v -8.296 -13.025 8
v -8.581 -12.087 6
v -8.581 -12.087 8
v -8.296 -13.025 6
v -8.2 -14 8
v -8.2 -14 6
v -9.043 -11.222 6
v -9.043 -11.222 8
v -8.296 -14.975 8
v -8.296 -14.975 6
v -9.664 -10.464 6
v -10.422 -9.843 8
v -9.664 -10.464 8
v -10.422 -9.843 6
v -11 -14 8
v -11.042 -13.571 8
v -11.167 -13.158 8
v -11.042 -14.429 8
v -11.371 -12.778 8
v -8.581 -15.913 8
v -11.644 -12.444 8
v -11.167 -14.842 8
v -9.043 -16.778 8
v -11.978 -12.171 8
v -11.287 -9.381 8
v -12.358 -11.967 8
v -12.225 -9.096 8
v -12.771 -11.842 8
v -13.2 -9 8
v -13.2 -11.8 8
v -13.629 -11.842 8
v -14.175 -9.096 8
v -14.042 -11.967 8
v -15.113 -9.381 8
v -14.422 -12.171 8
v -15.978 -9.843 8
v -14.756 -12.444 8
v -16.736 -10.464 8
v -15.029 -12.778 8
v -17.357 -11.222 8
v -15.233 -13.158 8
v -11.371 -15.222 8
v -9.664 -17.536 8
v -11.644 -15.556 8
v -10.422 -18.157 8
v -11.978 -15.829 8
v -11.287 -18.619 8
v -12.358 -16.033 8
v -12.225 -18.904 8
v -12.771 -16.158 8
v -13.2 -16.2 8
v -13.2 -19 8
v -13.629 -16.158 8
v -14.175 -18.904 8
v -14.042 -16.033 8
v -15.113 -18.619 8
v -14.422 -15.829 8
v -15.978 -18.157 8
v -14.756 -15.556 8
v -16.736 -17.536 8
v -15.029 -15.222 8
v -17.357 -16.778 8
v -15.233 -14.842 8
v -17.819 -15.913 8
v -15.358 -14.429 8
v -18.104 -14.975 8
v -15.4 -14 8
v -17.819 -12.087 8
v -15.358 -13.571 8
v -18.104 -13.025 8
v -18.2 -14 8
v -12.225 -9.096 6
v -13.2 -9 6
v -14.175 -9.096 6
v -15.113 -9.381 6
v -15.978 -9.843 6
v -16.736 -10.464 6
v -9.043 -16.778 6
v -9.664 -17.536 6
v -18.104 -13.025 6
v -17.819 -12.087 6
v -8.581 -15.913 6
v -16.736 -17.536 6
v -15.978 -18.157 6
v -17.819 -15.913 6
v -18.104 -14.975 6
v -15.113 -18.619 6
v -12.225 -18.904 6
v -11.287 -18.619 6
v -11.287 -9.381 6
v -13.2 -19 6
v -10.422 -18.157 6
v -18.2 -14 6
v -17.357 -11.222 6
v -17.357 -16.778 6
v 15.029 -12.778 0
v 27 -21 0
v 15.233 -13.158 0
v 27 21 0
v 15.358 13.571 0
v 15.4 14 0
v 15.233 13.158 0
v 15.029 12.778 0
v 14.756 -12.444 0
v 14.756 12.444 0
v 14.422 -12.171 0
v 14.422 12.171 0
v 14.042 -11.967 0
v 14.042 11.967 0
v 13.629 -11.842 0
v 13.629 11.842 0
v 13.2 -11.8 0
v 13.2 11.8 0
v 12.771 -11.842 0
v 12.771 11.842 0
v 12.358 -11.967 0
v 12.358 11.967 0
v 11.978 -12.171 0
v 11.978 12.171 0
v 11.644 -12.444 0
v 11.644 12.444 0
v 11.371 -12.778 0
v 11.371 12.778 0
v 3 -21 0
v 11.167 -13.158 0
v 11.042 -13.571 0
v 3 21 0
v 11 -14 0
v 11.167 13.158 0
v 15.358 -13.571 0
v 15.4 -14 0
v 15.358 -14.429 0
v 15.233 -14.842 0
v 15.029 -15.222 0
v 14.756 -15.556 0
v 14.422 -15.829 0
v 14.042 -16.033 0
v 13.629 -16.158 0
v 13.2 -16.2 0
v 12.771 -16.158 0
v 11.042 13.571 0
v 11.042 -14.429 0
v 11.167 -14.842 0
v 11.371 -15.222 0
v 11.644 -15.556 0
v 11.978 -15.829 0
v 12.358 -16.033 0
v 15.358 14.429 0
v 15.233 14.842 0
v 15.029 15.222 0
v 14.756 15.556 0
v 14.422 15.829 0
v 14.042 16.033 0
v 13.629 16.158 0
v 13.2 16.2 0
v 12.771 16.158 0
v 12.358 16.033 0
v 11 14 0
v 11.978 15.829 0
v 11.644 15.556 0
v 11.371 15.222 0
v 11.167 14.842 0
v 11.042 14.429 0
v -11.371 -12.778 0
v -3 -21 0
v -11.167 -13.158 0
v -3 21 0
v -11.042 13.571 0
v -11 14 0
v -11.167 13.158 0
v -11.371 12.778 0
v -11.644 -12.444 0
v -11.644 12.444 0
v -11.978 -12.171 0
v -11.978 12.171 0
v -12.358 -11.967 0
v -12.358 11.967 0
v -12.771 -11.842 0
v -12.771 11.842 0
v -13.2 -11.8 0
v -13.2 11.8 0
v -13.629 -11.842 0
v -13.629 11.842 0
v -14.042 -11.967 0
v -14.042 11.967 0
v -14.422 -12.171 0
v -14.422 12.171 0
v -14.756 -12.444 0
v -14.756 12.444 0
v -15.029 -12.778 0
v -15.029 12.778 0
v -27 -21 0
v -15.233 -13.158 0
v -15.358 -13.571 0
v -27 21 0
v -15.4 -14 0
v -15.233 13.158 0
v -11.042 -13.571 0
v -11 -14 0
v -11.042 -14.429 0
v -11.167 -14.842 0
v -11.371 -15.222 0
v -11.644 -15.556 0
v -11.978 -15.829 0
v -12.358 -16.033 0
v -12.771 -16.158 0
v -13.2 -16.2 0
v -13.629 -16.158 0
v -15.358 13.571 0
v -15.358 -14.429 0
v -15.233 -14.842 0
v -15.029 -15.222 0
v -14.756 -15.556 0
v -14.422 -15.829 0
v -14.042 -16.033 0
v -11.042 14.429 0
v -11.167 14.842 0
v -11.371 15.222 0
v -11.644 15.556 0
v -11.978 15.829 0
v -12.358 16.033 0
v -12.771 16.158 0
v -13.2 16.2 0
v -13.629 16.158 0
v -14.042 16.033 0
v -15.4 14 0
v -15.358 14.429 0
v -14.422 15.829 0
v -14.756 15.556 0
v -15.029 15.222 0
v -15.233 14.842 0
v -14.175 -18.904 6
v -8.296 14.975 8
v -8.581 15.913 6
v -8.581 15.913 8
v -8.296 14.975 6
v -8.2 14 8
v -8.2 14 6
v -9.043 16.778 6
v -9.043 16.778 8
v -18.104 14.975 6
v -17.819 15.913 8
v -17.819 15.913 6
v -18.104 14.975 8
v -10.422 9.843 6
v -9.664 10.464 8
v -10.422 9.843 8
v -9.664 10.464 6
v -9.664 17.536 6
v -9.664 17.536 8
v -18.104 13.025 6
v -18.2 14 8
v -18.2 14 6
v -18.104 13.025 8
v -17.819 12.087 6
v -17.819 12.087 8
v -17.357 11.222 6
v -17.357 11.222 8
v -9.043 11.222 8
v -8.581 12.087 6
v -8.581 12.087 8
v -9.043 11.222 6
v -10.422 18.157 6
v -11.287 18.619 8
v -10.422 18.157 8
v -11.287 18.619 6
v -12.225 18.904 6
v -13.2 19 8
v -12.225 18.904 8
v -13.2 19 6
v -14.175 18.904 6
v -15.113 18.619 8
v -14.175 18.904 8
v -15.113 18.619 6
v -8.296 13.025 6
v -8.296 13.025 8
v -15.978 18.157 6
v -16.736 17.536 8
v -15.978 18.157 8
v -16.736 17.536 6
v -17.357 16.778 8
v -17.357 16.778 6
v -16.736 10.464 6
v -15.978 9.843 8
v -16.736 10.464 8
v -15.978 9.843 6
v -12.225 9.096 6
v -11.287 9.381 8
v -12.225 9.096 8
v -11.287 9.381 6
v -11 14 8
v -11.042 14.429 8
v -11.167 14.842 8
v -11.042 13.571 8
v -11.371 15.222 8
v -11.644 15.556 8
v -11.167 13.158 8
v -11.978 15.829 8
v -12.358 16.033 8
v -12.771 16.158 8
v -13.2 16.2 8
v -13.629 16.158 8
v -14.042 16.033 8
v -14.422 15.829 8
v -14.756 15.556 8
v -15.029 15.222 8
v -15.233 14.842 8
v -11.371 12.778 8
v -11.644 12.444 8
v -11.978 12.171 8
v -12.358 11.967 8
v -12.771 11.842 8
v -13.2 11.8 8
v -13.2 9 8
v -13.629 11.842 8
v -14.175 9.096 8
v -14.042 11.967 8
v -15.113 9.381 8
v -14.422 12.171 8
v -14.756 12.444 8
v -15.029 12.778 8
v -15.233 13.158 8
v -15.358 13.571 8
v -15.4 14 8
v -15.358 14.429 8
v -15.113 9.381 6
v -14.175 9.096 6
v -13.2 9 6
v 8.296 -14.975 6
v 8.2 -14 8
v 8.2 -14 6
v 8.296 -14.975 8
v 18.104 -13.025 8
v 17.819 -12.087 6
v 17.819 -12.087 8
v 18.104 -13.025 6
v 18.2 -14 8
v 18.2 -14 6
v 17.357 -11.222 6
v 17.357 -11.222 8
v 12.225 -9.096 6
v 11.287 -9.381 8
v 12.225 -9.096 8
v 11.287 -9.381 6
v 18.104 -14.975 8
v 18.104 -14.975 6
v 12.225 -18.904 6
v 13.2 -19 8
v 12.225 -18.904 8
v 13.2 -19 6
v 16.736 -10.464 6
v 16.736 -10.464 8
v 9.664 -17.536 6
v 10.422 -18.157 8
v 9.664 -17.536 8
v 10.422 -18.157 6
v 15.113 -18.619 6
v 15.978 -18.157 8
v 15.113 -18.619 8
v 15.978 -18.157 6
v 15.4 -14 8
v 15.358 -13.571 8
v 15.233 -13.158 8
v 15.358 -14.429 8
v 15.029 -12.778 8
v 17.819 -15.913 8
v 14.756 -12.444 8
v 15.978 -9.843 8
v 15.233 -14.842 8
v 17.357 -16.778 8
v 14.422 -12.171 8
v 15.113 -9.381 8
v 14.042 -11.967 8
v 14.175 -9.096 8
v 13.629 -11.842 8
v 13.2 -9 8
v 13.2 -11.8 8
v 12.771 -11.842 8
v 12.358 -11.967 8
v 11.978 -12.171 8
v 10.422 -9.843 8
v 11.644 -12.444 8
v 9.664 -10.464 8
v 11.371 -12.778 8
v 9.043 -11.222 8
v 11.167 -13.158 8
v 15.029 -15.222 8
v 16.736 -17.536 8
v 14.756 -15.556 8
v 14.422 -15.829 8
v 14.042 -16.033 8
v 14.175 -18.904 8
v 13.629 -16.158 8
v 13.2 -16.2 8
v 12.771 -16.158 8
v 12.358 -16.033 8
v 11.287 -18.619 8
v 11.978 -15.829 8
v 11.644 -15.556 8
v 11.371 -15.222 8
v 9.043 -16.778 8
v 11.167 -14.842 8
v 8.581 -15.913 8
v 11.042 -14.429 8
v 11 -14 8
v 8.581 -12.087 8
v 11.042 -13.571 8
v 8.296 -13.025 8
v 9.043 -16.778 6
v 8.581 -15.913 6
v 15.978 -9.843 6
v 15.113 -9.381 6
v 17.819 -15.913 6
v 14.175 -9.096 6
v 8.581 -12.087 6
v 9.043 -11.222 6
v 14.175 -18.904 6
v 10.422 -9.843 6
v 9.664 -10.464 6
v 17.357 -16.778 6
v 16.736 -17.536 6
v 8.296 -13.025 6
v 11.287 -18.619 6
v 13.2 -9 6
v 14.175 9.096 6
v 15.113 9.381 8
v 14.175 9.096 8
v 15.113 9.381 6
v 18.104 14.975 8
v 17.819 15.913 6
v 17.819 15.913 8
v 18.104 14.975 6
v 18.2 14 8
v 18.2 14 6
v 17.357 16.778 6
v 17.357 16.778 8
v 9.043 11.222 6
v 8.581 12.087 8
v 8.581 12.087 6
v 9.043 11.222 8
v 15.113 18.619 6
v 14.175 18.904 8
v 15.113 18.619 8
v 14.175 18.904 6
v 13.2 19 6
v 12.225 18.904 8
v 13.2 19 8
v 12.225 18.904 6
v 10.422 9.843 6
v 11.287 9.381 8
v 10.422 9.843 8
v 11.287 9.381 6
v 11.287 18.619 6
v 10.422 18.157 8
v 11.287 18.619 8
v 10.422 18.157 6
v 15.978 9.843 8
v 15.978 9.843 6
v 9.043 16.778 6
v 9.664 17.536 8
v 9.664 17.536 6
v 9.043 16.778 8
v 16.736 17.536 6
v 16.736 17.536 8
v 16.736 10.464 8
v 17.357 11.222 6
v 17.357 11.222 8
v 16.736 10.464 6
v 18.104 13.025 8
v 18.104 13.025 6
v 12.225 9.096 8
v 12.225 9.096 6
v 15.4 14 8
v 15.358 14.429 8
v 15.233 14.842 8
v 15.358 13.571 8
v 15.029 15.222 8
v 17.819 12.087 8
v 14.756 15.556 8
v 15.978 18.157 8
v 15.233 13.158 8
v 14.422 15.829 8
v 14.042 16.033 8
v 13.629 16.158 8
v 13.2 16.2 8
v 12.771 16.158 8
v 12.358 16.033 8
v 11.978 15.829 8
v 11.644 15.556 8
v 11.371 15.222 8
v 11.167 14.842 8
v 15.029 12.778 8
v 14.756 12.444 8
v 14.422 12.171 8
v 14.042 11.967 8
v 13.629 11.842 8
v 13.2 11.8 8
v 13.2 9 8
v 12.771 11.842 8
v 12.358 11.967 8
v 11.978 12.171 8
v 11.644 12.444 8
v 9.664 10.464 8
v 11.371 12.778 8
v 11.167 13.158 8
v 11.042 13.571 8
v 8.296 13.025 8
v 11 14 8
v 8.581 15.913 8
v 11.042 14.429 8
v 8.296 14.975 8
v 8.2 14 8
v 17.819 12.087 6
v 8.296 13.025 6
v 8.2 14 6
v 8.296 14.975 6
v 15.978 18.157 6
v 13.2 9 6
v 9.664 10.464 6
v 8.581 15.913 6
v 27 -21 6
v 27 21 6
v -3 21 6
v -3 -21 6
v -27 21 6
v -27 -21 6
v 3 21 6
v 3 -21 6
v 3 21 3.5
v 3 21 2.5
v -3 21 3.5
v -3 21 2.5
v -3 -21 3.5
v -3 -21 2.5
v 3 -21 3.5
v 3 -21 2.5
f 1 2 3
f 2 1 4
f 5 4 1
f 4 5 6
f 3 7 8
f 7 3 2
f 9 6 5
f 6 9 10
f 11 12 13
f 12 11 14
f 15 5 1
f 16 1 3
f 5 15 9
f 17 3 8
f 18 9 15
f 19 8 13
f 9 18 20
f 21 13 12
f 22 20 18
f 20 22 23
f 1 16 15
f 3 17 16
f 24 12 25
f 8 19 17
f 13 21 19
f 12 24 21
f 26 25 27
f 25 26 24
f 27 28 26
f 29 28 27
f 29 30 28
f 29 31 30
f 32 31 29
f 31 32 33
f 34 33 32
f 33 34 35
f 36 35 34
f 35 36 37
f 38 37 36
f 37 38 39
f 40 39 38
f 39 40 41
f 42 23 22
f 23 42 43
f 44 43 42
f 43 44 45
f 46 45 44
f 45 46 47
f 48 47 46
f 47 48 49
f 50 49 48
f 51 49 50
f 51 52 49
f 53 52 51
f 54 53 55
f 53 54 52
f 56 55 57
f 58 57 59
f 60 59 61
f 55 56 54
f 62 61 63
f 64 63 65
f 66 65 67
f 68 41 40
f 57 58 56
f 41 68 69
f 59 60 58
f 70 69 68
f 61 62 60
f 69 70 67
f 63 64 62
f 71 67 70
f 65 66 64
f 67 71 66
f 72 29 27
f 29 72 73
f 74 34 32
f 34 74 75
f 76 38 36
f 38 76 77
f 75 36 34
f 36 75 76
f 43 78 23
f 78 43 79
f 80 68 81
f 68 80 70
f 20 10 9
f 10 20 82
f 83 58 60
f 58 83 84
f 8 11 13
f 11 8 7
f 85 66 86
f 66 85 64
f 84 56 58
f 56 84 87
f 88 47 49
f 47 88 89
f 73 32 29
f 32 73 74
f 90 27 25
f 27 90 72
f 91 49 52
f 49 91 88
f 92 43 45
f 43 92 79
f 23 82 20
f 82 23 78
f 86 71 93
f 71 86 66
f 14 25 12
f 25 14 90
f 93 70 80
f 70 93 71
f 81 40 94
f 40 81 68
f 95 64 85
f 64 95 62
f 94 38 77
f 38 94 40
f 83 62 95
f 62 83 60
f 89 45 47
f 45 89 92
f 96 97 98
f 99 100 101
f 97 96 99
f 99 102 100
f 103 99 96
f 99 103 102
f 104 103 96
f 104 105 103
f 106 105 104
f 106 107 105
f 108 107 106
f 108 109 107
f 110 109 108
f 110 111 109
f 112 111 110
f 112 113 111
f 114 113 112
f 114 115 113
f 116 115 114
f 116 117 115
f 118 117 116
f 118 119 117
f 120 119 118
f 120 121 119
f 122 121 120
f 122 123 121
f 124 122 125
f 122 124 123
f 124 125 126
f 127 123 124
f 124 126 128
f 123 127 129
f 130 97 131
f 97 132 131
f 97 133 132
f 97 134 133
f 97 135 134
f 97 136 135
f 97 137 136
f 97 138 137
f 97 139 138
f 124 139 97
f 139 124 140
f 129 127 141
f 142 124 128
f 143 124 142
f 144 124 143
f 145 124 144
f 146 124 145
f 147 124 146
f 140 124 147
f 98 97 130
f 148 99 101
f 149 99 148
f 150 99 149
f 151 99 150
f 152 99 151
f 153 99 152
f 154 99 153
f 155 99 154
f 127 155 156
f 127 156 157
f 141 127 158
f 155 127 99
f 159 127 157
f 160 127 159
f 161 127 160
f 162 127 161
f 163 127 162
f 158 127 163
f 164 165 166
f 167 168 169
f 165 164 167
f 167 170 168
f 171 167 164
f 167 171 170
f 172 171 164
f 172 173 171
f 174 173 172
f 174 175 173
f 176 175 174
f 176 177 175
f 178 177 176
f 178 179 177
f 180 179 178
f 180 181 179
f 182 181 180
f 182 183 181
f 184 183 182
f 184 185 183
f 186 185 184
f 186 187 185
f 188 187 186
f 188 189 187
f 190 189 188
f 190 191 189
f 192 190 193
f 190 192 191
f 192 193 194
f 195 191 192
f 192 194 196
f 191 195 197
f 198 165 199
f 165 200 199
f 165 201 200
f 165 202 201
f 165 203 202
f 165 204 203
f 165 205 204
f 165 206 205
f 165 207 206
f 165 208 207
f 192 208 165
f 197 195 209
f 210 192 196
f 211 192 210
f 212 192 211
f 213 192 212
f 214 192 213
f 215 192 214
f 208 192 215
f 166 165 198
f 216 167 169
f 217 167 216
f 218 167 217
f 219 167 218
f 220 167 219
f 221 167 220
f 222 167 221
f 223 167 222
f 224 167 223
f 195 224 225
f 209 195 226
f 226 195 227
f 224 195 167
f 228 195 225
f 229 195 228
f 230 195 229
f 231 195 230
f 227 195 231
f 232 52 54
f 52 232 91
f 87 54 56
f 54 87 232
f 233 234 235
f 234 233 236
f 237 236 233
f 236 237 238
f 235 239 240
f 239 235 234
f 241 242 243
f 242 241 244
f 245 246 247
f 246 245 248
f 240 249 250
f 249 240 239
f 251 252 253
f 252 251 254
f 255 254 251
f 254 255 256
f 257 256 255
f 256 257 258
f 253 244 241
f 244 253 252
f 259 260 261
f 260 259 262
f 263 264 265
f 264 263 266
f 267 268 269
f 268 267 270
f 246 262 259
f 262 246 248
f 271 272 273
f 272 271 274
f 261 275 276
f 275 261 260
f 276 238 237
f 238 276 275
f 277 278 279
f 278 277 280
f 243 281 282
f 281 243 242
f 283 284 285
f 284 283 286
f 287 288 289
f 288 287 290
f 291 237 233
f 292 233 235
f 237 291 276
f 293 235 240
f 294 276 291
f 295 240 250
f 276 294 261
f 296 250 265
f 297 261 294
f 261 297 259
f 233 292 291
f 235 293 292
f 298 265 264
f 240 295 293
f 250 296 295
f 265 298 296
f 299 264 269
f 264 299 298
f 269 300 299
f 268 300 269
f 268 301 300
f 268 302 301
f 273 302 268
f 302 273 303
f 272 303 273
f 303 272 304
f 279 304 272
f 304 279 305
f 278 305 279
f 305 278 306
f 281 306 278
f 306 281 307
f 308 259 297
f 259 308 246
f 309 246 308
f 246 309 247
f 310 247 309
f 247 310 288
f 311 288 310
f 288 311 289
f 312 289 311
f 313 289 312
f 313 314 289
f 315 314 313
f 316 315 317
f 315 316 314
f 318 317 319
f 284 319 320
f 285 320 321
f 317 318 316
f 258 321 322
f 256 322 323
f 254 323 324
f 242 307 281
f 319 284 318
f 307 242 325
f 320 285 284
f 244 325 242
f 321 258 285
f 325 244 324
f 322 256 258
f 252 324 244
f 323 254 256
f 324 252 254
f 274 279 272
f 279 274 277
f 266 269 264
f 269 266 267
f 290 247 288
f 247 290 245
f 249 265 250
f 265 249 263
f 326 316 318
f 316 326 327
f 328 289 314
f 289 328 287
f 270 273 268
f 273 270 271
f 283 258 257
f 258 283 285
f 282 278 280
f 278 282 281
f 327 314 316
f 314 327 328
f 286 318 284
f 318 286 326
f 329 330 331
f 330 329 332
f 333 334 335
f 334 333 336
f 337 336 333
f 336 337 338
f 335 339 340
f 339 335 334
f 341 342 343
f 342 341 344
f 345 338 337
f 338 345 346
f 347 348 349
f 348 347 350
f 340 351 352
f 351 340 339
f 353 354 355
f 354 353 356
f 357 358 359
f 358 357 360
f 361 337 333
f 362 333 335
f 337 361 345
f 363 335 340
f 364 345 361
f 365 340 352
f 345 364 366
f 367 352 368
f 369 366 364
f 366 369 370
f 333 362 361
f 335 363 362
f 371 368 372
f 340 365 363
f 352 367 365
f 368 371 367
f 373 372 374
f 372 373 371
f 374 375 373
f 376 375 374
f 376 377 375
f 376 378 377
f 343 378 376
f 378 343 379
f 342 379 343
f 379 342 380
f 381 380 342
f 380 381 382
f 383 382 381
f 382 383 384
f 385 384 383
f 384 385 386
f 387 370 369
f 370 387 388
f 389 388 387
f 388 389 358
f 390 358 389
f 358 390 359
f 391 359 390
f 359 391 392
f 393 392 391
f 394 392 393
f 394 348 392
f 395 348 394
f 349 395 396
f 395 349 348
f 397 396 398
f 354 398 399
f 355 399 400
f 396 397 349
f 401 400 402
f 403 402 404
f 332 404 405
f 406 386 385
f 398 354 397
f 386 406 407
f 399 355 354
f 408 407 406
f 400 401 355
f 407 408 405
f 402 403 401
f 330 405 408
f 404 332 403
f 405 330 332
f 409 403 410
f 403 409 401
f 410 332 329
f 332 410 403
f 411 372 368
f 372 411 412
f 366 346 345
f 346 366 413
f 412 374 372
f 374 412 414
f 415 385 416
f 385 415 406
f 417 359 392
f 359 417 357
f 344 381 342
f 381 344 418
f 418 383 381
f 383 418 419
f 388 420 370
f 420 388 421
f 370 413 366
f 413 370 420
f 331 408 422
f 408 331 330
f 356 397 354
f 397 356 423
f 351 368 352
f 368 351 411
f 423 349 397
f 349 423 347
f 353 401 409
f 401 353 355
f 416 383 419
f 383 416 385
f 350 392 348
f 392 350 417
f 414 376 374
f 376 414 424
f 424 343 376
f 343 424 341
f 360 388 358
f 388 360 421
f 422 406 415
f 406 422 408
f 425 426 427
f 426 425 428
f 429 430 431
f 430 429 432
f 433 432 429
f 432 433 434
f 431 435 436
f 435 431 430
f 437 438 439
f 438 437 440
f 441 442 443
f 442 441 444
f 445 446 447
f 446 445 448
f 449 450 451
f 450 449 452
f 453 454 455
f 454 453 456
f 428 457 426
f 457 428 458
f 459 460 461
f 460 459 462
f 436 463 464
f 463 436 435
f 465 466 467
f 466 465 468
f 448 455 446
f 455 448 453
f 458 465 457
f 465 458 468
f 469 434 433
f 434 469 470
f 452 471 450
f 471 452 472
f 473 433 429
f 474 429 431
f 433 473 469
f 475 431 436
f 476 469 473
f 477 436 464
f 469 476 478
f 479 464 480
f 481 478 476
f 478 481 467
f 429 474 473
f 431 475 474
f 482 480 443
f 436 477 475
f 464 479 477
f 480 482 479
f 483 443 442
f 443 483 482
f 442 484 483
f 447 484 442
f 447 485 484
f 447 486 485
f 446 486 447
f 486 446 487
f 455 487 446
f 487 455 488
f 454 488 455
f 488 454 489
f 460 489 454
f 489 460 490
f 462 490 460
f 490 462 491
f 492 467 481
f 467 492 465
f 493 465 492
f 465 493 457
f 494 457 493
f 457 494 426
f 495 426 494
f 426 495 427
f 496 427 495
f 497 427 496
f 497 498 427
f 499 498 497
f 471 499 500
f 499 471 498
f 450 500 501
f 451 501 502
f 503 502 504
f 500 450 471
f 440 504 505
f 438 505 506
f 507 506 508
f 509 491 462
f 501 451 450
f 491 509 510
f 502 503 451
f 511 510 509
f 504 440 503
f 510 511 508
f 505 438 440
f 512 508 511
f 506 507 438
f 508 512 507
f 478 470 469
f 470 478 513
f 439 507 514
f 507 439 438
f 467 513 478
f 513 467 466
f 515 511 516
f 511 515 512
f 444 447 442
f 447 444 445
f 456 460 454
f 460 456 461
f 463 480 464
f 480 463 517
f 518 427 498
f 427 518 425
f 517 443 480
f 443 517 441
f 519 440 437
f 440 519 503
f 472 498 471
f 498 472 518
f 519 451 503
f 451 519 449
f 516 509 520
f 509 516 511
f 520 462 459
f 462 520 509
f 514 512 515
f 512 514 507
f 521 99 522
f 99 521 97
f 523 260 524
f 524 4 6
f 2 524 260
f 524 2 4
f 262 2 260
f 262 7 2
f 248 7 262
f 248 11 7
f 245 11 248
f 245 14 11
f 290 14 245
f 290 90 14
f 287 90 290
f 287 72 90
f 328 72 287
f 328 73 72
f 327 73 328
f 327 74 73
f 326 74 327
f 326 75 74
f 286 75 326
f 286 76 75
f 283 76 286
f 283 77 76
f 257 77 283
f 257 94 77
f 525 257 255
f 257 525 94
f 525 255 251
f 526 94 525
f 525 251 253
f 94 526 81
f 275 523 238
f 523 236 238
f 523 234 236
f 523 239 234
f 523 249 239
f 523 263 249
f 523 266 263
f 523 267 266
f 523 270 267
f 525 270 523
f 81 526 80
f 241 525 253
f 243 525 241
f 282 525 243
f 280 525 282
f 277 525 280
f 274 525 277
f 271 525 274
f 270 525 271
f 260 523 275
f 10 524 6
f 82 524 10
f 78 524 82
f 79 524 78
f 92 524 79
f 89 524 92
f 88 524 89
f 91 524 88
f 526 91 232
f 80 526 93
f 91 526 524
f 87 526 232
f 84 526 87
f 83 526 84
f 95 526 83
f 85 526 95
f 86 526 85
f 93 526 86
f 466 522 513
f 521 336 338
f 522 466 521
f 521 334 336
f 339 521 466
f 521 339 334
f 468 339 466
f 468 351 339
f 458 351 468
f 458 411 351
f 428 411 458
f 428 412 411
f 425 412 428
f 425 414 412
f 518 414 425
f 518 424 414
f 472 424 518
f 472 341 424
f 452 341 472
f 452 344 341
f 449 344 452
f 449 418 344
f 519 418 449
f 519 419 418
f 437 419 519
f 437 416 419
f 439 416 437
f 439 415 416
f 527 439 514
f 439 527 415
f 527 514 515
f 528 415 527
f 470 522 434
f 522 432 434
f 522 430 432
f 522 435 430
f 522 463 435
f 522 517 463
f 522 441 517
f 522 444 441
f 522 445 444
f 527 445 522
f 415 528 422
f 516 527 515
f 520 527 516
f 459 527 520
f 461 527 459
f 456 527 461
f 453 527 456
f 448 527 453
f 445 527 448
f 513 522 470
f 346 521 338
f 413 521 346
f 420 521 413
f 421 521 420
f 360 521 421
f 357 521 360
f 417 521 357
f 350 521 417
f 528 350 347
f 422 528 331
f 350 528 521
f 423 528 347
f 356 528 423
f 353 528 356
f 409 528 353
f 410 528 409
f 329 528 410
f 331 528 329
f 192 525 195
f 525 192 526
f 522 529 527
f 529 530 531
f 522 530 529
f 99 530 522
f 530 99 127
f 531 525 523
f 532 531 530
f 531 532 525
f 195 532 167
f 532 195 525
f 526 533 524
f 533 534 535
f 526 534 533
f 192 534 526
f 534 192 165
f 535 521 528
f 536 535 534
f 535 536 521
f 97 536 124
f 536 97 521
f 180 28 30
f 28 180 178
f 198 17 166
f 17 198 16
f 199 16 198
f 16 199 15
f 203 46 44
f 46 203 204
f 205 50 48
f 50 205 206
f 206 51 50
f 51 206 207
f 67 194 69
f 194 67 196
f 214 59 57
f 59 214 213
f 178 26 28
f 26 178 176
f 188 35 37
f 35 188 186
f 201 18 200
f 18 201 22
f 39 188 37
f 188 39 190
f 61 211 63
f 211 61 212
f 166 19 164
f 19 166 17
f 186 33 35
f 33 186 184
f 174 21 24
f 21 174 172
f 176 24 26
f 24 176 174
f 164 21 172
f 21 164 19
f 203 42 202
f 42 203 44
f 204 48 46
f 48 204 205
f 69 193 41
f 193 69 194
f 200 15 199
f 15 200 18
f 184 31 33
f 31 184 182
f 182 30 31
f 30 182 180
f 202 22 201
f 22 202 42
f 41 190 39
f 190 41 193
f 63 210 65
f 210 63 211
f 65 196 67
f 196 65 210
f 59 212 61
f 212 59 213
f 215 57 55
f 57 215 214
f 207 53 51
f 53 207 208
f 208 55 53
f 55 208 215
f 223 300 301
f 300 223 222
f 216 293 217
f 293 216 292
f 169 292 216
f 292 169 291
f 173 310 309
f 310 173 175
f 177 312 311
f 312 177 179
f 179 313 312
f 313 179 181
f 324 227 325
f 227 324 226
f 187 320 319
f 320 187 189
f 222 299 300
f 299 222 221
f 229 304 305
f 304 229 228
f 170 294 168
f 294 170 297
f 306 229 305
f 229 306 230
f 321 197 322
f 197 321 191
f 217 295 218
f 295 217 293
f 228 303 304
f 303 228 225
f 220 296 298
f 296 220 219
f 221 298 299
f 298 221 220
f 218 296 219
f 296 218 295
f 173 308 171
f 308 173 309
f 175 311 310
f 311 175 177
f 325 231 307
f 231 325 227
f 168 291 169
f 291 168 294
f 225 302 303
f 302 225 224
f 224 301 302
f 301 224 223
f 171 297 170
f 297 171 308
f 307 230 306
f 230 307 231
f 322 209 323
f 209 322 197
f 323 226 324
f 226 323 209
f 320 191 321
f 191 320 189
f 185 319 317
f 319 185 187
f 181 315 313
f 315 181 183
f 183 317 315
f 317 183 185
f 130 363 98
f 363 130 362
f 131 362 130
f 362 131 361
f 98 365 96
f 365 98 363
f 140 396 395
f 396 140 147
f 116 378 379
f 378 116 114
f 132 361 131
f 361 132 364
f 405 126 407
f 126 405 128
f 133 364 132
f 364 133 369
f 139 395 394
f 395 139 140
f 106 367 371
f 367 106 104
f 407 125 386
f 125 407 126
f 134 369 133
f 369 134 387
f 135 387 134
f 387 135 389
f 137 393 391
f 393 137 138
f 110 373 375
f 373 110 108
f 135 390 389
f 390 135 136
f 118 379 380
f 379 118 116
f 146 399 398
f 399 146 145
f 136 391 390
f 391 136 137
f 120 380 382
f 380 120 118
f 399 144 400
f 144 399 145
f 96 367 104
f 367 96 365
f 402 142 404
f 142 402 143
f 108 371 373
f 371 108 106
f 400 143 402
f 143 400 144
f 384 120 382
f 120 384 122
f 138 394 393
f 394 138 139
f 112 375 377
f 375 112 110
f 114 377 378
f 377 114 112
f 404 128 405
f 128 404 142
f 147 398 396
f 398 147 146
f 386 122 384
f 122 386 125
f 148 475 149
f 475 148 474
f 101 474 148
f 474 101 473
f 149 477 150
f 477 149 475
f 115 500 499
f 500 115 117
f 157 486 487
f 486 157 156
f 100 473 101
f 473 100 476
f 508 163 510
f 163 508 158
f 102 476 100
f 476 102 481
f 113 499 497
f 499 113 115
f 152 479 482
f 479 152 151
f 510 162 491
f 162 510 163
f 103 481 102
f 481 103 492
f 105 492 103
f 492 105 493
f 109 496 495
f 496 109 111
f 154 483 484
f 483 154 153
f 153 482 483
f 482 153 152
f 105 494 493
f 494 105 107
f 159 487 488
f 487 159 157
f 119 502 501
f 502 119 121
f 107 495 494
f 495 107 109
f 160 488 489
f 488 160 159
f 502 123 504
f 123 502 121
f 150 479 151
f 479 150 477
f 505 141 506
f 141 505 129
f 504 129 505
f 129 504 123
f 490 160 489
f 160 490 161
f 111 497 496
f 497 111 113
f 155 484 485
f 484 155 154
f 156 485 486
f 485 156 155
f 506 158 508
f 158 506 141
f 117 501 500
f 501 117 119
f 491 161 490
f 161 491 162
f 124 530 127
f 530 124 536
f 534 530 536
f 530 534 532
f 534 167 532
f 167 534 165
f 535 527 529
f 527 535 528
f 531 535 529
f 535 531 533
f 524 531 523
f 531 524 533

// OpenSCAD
$fn = 32;

// ----------------------------------------------------------------------
// Living hinge: 54 x 42 mm plates, 1 mm flexible web
// ----------------------------------------------------------------------

// --- parameters (mm) ---
plate_len = 24;           // plate length outside the web
plate_w = 42;             // plate width
thick = 6;                // plate thickness
web_half = 3;             // half width of the flex band
web_t = 1;                // flexible web thickness
web_z = 2.5;              // web position inside the thickness
boss_d = 10;              // screw boss diameter
boss_h = 8;               // screw boss height
boss_x = 13.2;            // screw boss distance from the web
screw_d = 4.4;            // screw hole

difference() {
  union() {
    /* one flat strip, later thinned at the middle */
    translate([-27, -21, 0]) cube([54, 42, 6]);
    /* screw bosses, sunk 0.5 mm into the plates */
    for (sx = [-13.2, 13.2]) {
      for (sy = [-14, 14]) {
        translate([sx, sy, 0]) cylinder(h = boss_h, d = boss_d);
      }
    }
  }
  /* channel from below: leaves the web on top of it */
  translate([-3, -23.5, -2.5]) cube([6, 47, 5]);
  /* channel from above: thins the web down to web_t */
  translate([-3, -23.5, 3.5]) cube([6, 47, 5]);
  /* screw holes through the bosses */
  for (sx = [-13.2, 13.2]) {
    for (sy = [-14, 14]) {
      translate([sx, sy, -2.5]) cylinder(h = boss_h + 5, d = screw_d);
    }
  }
}
